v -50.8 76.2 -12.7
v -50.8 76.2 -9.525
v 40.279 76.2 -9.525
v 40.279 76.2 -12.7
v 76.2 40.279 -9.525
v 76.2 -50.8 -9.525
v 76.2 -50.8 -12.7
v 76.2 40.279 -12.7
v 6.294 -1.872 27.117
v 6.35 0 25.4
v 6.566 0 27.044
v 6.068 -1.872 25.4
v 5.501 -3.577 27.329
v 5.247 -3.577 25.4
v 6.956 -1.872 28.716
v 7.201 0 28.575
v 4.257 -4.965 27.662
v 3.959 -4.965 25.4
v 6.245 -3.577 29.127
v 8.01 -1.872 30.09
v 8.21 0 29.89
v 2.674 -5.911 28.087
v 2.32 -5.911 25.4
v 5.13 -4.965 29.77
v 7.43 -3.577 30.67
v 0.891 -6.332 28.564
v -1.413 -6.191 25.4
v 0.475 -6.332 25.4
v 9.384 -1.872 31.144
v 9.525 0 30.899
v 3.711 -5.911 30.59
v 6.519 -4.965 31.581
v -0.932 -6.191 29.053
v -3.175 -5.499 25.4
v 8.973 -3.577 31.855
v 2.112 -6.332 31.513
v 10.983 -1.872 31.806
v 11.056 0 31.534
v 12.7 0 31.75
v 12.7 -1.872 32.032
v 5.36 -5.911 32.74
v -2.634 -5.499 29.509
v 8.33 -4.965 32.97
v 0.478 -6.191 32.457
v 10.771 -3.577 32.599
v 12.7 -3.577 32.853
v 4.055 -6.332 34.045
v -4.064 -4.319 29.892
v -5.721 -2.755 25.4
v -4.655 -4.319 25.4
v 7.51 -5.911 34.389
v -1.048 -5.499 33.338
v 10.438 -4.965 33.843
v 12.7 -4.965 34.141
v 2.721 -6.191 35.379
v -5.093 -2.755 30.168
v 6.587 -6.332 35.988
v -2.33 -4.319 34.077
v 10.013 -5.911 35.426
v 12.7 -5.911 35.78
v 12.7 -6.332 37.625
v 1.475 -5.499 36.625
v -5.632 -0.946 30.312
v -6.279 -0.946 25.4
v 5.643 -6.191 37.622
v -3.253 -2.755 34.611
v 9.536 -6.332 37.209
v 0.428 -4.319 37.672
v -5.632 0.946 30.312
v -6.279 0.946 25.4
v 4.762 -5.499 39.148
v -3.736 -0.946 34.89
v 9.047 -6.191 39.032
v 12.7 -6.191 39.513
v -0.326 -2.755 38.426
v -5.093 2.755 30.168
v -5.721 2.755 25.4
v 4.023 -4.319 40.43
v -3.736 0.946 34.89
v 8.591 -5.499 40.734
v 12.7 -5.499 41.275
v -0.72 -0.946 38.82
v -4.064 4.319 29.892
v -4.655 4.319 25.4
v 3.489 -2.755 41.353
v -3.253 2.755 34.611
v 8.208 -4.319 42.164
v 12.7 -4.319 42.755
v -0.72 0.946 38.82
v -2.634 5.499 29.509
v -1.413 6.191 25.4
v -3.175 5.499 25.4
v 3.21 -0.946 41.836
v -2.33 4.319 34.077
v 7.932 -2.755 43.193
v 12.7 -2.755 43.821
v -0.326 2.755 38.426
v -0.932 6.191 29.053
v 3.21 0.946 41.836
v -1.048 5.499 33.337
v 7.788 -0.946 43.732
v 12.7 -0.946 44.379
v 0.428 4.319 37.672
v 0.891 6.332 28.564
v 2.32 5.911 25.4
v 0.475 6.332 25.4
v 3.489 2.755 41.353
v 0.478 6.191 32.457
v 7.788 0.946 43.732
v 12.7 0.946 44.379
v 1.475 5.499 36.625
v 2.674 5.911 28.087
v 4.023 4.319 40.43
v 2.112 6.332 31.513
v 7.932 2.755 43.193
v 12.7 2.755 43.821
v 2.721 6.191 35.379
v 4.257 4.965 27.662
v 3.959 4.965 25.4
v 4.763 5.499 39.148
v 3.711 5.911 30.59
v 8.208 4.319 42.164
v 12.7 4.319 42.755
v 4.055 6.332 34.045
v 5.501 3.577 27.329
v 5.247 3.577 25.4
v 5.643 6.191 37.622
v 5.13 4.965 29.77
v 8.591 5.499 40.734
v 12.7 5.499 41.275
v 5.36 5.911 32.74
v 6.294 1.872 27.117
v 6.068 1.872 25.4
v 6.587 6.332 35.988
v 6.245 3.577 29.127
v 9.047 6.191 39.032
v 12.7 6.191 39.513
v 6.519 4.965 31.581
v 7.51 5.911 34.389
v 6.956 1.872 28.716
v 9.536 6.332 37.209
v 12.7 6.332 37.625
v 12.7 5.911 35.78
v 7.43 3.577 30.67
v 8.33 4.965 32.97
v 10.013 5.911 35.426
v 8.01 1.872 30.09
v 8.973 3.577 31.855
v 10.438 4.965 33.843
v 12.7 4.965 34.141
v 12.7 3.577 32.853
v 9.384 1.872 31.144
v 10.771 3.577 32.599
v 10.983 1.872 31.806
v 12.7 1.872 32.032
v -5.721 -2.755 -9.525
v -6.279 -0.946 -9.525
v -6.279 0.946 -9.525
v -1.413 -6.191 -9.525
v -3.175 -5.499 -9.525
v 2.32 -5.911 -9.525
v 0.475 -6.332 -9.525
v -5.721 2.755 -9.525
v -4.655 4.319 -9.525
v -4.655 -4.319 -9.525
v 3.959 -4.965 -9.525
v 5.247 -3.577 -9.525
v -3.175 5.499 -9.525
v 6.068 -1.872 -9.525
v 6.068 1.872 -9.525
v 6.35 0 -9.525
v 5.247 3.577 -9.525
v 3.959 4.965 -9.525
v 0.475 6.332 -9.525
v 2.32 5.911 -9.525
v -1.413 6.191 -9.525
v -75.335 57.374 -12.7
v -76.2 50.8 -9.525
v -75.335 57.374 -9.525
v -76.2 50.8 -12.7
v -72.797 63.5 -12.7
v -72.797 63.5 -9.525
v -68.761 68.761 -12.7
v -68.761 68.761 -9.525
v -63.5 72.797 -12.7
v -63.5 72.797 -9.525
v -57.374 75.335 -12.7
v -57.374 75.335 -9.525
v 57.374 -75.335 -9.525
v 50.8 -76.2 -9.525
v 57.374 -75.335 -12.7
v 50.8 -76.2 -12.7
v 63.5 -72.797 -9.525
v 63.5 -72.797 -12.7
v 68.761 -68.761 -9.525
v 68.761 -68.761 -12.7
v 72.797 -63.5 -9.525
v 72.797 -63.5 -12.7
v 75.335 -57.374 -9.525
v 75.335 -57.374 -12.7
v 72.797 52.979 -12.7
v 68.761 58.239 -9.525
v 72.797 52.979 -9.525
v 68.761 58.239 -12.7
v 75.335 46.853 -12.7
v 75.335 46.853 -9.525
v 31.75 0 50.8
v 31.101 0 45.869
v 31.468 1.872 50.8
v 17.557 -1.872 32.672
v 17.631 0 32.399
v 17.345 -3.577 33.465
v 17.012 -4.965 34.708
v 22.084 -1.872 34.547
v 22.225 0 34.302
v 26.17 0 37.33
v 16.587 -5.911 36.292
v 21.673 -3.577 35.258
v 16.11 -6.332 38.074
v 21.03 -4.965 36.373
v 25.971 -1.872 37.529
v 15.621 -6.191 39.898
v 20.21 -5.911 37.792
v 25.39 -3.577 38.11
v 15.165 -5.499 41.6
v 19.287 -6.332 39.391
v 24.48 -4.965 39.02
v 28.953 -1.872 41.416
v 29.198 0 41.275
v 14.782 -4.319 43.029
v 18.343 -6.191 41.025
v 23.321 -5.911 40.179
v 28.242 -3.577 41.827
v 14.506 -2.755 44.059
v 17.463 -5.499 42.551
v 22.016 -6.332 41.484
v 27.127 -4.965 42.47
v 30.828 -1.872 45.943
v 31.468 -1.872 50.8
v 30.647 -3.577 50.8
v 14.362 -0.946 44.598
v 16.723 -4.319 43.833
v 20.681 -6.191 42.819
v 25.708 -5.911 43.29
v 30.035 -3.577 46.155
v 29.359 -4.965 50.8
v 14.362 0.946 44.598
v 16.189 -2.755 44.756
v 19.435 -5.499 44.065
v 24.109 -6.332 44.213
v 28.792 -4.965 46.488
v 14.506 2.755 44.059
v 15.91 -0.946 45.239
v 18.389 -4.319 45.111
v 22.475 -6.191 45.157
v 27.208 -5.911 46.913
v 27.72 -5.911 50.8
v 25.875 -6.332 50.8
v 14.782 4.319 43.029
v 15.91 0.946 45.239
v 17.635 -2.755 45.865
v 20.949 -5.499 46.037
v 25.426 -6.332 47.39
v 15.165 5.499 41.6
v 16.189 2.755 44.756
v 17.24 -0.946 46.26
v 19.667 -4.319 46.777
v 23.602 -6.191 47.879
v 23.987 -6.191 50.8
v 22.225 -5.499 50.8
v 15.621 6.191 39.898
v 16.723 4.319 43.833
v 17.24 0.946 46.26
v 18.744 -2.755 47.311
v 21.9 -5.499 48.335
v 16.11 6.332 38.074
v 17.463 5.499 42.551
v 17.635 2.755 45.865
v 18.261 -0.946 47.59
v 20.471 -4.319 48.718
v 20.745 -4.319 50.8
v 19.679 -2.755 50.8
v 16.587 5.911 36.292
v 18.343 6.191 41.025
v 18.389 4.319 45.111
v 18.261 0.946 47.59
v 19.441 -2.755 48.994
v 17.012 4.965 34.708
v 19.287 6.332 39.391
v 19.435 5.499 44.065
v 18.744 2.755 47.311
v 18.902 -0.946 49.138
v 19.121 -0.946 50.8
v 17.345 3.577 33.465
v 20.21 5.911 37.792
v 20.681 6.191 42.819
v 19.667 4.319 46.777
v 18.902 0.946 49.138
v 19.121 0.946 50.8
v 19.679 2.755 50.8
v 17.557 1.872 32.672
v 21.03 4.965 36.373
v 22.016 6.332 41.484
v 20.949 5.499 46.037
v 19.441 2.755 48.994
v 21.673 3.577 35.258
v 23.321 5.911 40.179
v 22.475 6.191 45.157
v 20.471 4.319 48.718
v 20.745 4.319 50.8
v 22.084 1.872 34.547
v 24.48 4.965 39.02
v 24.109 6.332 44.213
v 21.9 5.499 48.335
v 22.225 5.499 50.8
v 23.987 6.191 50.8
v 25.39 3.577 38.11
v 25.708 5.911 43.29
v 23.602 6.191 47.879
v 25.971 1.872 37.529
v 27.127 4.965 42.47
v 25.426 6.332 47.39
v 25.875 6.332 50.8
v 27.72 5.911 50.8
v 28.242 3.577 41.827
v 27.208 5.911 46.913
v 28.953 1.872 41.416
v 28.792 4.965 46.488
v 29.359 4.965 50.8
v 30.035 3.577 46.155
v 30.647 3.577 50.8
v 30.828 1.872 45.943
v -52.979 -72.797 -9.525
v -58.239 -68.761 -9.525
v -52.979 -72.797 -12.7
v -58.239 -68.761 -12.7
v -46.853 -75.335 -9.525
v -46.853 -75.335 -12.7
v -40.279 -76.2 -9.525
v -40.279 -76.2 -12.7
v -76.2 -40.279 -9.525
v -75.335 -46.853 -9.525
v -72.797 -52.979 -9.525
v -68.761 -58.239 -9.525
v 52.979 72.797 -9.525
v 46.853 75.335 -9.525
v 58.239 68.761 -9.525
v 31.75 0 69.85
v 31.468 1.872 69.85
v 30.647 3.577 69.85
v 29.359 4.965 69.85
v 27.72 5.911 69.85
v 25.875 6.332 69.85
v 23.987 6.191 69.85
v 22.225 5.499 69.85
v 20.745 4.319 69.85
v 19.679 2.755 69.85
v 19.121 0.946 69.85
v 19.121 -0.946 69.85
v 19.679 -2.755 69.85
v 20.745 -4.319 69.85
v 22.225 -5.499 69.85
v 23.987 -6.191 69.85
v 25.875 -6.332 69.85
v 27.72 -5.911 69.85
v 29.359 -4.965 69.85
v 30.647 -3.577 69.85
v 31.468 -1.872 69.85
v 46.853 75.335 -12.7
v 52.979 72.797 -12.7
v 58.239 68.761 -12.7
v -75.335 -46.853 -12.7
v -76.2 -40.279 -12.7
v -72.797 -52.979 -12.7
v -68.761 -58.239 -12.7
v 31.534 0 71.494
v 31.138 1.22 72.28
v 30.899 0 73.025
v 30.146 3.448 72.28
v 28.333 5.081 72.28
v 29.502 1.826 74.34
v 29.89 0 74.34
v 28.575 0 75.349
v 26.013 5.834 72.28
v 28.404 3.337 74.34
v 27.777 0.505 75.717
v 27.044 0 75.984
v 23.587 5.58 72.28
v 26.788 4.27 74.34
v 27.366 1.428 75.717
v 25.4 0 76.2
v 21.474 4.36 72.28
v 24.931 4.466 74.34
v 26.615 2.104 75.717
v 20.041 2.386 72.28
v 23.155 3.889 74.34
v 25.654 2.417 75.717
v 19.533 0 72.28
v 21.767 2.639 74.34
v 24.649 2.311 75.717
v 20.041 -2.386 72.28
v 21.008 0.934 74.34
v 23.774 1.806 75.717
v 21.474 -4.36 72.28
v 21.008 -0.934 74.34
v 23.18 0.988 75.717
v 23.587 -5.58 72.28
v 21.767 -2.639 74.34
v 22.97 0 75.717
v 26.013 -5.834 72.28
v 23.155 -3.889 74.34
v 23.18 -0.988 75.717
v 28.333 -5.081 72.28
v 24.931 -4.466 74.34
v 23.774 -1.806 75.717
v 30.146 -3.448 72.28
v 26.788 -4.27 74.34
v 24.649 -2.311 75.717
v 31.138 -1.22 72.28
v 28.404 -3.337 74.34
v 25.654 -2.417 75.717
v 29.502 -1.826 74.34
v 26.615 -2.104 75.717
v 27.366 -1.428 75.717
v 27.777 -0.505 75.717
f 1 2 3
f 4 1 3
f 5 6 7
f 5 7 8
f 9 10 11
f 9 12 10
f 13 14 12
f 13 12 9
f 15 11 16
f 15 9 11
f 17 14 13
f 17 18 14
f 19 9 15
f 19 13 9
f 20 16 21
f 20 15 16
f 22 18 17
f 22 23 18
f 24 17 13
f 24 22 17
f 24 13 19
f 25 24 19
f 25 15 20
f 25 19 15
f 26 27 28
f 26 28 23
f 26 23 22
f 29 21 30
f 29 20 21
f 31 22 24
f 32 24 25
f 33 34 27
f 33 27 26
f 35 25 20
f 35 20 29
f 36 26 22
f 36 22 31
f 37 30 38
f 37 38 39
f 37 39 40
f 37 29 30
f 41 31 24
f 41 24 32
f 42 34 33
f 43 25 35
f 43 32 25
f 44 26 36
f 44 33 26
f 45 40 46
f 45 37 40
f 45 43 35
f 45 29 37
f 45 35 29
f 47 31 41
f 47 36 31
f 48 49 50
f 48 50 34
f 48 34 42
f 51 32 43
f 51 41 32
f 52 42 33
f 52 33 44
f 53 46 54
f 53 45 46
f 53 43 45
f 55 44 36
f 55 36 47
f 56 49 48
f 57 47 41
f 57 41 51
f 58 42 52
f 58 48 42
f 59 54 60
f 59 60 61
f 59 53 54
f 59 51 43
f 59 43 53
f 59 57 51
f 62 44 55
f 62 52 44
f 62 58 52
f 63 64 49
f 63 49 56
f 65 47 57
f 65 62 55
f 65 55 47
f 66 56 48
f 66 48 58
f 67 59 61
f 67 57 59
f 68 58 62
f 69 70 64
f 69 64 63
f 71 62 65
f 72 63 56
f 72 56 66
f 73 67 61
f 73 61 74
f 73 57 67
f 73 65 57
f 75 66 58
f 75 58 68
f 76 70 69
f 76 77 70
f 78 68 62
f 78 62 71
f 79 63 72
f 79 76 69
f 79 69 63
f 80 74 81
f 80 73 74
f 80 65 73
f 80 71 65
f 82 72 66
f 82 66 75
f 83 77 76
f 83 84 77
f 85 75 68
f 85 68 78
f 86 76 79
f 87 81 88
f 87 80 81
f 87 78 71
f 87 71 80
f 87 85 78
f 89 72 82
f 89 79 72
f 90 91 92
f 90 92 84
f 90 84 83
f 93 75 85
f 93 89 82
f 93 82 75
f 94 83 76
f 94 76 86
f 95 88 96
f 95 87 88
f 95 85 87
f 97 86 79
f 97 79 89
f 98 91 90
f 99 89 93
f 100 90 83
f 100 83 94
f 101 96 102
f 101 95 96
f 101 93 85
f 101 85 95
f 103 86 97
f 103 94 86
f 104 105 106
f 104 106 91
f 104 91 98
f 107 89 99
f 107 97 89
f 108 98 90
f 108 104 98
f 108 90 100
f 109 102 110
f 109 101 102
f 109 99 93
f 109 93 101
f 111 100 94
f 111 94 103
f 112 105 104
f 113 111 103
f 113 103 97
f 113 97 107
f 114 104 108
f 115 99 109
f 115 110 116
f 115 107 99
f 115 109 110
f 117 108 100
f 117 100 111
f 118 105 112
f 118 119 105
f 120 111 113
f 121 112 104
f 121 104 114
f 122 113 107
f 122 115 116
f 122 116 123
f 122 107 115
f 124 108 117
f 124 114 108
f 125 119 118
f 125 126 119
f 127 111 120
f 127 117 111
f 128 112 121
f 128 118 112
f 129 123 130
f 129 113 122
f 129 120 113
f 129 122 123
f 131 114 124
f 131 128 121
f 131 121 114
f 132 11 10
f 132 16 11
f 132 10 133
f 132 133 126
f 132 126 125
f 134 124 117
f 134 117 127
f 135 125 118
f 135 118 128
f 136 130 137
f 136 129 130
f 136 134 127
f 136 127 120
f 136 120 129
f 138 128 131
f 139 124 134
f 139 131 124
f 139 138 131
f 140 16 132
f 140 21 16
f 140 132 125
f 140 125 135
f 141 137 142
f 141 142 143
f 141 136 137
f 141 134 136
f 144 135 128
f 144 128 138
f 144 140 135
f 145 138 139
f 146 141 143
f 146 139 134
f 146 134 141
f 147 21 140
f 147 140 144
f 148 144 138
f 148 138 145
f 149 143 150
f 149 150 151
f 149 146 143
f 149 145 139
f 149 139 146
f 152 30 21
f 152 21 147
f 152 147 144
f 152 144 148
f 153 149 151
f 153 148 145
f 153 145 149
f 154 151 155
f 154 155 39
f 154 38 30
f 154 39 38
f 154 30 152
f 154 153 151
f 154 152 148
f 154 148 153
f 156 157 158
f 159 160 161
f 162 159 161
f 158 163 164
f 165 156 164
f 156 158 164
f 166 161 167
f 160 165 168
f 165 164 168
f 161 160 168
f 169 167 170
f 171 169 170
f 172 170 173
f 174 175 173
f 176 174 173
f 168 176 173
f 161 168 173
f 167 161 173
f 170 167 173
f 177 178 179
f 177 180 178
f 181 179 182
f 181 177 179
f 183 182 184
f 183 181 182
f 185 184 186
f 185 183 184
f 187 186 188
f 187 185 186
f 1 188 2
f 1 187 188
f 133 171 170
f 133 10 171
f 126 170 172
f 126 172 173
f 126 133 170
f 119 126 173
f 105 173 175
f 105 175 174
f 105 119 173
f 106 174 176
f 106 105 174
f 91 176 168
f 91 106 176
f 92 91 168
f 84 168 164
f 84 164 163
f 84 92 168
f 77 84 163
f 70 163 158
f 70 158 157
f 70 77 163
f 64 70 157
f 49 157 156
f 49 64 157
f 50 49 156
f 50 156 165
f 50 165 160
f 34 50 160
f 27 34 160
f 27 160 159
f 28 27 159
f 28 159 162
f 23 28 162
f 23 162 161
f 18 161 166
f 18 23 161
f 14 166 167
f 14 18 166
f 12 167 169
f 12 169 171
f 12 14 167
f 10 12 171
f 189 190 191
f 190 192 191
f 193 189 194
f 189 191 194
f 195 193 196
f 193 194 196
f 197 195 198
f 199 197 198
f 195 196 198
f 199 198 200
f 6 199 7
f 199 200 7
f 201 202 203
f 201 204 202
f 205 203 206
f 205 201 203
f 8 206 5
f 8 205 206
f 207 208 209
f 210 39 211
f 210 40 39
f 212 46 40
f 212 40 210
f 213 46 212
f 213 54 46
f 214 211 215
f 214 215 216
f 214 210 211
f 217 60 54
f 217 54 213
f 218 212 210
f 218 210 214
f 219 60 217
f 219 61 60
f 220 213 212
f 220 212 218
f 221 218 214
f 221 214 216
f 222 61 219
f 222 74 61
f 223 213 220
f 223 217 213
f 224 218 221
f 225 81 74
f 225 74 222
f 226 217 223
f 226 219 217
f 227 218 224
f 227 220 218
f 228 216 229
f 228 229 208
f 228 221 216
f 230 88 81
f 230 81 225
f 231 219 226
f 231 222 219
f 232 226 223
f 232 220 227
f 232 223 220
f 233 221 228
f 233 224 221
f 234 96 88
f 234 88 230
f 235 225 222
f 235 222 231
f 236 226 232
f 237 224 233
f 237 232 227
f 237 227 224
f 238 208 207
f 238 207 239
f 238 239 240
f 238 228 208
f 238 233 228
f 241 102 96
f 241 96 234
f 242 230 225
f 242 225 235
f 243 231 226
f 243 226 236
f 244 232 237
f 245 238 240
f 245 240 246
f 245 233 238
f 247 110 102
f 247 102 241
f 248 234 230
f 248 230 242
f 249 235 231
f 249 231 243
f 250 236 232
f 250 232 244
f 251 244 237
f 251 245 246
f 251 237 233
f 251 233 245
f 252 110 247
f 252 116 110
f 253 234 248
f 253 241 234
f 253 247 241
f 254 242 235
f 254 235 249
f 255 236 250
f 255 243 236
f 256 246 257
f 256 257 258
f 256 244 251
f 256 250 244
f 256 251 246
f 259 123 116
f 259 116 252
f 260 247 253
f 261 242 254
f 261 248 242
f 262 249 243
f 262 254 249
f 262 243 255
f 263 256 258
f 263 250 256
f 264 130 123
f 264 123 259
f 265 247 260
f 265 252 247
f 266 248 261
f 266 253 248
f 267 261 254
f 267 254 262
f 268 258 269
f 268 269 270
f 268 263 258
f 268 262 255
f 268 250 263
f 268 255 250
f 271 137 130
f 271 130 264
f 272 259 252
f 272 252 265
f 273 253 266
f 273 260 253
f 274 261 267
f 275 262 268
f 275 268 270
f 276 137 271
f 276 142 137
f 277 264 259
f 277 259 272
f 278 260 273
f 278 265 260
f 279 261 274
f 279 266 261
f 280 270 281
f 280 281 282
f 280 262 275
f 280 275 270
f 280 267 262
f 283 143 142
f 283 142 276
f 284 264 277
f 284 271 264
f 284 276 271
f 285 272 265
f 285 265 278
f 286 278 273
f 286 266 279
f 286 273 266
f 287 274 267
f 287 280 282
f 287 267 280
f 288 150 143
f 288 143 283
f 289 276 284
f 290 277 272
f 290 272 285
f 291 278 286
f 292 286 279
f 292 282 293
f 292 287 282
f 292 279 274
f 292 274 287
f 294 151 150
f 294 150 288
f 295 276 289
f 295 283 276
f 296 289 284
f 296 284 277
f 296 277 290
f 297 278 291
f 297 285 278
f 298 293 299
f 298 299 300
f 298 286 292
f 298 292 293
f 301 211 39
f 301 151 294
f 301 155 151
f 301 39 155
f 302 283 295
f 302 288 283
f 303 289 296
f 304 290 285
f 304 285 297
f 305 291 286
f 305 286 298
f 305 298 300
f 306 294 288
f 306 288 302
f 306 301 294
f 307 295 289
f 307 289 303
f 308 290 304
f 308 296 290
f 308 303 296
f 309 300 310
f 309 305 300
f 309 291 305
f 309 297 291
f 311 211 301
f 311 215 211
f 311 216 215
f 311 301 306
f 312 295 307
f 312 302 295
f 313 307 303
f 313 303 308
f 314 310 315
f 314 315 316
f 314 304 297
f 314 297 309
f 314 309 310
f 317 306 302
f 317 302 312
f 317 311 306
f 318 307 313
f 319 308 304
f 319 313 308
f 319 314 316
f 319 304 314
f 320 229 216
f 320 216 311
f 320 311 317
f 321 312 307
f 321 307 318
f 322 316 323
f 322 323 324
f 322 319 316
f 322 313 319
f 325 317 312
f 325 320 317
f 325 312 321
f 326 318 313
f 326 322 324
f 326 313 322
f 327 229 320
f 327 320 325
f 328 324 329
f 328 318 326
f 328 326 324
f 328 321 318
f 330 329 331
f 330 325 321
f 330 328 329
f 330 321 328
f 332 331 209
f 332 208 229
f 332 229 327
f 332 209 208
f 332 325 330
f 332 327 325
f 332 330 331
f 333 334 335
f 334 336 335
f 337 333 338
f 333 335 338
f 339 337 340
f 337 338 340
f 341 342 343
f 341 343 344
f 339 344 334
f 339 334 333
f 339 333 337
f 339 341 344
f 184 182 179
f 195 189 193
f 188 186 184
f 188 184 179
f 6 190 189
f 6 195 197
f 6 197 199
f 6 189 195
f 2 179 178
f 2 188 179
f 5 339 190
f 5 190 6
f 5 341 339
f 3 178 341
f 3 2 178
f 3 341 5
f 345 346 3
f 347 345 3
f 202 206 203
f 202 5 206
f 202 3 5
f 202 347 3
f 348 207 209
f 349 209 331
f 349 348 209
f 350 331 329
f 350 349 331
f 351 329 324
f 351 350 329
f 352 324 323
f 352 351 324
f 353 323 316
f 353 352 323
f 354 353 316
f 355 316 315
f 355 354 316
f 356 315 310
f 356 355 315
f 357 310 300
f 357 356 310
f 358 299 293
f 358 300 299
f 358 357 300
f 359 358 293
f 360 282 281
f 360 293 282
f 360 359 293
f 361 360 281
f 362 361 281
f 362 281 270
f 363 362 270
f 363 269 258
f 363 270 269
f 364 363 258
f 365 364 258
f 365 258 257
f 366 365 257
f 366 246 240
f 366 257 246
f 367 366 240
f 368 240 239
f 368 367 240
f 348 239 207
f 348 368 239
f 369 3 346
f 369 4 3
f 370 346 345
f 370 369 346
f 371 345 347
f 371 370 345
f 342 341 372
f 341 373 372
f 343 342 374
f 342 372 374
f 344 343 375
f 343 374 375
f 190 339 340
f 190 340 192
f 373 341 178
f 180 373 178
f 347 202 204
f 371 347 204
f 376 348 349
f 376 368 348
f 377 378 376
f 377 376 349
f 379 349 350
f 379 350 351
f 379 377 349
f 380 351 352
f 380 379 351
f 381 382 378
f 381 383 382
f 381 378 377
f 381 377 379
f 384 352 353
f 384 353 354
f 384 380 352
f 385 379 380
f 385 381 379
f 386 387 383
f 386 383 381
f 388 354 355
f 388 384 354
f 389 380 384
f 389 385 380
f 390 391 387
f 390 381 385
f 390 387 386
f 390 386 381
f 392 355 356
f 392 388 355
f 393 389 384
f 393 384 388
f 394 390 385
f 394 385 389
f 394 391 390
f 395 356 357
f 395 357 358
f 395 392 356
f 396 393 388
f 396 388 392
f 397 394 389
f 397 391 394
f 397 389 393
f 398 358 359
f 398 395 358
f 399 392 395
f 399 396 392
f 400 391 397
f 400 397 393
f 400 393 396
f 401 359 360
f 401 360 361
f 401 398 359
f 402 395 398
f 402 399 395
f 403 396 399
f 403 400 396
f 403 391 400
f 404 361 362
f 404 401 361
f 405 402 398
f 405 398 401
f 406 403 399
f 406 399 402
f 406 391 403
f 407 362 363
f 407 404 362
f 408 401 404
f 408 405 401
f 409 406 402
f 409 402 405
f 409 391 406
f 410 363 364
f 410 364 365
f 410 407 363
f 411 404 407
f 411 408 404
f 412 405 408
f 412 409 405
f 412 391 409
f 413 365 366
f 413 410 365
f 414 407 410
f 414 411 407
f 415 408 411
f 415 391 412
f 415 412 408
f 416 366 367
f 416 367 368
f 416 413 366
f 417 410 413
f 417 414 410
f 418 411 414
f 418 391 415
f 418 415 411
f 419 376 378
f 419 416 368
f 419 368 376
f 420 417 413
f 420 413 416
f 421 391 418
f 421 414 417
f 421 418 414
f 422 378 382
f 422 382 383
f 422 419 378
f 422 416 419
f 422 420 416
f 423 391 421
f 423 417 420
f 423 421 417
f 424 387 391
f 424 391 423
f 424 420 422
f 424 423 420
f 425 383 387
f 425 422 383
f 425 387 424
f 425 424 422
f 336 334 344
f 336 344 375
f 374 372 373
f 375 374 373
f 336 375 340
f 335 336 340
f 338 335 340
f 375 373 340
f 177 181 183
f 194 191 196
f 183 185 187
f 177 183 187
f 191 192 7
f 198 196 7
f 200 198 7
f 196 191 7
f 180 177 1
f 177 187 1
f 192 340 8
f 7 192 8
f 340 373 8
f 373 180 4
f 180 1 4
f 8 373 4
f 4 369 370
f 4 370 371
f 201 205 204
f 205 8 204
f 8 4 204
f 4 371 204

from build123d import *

# Parameters (mm, degrees)
F3_R     = 6.35
F7_W     = 152.4
F7_H     = 152.4
F8_DEPTH = 3.175
F9_DEPTH = 9.525
F10_R    = 25.4
F11_SIZE = 25.4
F12_R    = 25.4
F13_R    = 6.35


# Not quite as in the source:
# - the program builds the solid bodies; features that only make, move or delete a surface that nothing else refers to are left out


with BuildPart() as f5:
    # F5: sweep along a path in F4
    with BuildLine(Plane.XZ) as f5_path:
        Line((0, 0), (0, 25.4))
        ThreePointArc((0, 25.4), (3.7197438789, 34.3802561211), (12.7, 38.1))
        ThreePointArc((12.7, 38.1), (21.6802561211, 41.8197438789), (25.4, 50.8))
        Line((25.4, 50.8), (25.4, 76.2))
    # F3 (on Top) → F5 (sweep)
    with BuildSketch(Plane.XY):
        Circle(F3_R)
    sweep(path=f5_path.line)

    # F9 (add): a face of the model
    f9_faces = [f5.faces().sort_by_distance(p)[0] for p in [
        (0, 0, 0),
    ]]
    extrude(f9_faces, amount=F9_DEPTH)

    # F13
    f13_edges = [f5.edges().sort_by_distance(p)[0] for p in [
        (19.05, 0, 76.2),
    ]]
    fillet(f13_edges, radius=F13_R)


with BuildPart() as f8:
    # F7 (on offset) → F8 (new body)
    with BuildSketch(Plane.XY.offset(-9.525)):
        Rectangle(F7_W, F7_H)
    extrude(amount=-F8_DEPTH)

    # F10
    f10_edges = [f8.edges().sort_by_distance(p)[0] for p in [
        (76.2, -76.2, -11.1125),
        (-76.2, 76.2, -11.1125),
    ]]
    fillet(f10_edges, radius=F10_R)

    # F11
    f11_edges = [f8.edges().sort_by_distance(p)[0] for p in [
        (-76.2, -76.2, -11.1125),
        (76.2, 76.2, -11.1125),
    ]]
    chamfer(f11_edges, length=F11_SIZE)

    # F12
    f12_edges = [f8.edges().sort_by_distance(p)[0] for p in [
        (-76.2, -50.8, -11.1125),
        (-50.8, -76.2, -11.1125),
        (76.2, 50.8, -11.1125),
        (50.8, 76.2, -11.1125),
    ]]
    fillet(f12_edges, radius=F12_R)


solid = Compound([f5.part, f8.part])
